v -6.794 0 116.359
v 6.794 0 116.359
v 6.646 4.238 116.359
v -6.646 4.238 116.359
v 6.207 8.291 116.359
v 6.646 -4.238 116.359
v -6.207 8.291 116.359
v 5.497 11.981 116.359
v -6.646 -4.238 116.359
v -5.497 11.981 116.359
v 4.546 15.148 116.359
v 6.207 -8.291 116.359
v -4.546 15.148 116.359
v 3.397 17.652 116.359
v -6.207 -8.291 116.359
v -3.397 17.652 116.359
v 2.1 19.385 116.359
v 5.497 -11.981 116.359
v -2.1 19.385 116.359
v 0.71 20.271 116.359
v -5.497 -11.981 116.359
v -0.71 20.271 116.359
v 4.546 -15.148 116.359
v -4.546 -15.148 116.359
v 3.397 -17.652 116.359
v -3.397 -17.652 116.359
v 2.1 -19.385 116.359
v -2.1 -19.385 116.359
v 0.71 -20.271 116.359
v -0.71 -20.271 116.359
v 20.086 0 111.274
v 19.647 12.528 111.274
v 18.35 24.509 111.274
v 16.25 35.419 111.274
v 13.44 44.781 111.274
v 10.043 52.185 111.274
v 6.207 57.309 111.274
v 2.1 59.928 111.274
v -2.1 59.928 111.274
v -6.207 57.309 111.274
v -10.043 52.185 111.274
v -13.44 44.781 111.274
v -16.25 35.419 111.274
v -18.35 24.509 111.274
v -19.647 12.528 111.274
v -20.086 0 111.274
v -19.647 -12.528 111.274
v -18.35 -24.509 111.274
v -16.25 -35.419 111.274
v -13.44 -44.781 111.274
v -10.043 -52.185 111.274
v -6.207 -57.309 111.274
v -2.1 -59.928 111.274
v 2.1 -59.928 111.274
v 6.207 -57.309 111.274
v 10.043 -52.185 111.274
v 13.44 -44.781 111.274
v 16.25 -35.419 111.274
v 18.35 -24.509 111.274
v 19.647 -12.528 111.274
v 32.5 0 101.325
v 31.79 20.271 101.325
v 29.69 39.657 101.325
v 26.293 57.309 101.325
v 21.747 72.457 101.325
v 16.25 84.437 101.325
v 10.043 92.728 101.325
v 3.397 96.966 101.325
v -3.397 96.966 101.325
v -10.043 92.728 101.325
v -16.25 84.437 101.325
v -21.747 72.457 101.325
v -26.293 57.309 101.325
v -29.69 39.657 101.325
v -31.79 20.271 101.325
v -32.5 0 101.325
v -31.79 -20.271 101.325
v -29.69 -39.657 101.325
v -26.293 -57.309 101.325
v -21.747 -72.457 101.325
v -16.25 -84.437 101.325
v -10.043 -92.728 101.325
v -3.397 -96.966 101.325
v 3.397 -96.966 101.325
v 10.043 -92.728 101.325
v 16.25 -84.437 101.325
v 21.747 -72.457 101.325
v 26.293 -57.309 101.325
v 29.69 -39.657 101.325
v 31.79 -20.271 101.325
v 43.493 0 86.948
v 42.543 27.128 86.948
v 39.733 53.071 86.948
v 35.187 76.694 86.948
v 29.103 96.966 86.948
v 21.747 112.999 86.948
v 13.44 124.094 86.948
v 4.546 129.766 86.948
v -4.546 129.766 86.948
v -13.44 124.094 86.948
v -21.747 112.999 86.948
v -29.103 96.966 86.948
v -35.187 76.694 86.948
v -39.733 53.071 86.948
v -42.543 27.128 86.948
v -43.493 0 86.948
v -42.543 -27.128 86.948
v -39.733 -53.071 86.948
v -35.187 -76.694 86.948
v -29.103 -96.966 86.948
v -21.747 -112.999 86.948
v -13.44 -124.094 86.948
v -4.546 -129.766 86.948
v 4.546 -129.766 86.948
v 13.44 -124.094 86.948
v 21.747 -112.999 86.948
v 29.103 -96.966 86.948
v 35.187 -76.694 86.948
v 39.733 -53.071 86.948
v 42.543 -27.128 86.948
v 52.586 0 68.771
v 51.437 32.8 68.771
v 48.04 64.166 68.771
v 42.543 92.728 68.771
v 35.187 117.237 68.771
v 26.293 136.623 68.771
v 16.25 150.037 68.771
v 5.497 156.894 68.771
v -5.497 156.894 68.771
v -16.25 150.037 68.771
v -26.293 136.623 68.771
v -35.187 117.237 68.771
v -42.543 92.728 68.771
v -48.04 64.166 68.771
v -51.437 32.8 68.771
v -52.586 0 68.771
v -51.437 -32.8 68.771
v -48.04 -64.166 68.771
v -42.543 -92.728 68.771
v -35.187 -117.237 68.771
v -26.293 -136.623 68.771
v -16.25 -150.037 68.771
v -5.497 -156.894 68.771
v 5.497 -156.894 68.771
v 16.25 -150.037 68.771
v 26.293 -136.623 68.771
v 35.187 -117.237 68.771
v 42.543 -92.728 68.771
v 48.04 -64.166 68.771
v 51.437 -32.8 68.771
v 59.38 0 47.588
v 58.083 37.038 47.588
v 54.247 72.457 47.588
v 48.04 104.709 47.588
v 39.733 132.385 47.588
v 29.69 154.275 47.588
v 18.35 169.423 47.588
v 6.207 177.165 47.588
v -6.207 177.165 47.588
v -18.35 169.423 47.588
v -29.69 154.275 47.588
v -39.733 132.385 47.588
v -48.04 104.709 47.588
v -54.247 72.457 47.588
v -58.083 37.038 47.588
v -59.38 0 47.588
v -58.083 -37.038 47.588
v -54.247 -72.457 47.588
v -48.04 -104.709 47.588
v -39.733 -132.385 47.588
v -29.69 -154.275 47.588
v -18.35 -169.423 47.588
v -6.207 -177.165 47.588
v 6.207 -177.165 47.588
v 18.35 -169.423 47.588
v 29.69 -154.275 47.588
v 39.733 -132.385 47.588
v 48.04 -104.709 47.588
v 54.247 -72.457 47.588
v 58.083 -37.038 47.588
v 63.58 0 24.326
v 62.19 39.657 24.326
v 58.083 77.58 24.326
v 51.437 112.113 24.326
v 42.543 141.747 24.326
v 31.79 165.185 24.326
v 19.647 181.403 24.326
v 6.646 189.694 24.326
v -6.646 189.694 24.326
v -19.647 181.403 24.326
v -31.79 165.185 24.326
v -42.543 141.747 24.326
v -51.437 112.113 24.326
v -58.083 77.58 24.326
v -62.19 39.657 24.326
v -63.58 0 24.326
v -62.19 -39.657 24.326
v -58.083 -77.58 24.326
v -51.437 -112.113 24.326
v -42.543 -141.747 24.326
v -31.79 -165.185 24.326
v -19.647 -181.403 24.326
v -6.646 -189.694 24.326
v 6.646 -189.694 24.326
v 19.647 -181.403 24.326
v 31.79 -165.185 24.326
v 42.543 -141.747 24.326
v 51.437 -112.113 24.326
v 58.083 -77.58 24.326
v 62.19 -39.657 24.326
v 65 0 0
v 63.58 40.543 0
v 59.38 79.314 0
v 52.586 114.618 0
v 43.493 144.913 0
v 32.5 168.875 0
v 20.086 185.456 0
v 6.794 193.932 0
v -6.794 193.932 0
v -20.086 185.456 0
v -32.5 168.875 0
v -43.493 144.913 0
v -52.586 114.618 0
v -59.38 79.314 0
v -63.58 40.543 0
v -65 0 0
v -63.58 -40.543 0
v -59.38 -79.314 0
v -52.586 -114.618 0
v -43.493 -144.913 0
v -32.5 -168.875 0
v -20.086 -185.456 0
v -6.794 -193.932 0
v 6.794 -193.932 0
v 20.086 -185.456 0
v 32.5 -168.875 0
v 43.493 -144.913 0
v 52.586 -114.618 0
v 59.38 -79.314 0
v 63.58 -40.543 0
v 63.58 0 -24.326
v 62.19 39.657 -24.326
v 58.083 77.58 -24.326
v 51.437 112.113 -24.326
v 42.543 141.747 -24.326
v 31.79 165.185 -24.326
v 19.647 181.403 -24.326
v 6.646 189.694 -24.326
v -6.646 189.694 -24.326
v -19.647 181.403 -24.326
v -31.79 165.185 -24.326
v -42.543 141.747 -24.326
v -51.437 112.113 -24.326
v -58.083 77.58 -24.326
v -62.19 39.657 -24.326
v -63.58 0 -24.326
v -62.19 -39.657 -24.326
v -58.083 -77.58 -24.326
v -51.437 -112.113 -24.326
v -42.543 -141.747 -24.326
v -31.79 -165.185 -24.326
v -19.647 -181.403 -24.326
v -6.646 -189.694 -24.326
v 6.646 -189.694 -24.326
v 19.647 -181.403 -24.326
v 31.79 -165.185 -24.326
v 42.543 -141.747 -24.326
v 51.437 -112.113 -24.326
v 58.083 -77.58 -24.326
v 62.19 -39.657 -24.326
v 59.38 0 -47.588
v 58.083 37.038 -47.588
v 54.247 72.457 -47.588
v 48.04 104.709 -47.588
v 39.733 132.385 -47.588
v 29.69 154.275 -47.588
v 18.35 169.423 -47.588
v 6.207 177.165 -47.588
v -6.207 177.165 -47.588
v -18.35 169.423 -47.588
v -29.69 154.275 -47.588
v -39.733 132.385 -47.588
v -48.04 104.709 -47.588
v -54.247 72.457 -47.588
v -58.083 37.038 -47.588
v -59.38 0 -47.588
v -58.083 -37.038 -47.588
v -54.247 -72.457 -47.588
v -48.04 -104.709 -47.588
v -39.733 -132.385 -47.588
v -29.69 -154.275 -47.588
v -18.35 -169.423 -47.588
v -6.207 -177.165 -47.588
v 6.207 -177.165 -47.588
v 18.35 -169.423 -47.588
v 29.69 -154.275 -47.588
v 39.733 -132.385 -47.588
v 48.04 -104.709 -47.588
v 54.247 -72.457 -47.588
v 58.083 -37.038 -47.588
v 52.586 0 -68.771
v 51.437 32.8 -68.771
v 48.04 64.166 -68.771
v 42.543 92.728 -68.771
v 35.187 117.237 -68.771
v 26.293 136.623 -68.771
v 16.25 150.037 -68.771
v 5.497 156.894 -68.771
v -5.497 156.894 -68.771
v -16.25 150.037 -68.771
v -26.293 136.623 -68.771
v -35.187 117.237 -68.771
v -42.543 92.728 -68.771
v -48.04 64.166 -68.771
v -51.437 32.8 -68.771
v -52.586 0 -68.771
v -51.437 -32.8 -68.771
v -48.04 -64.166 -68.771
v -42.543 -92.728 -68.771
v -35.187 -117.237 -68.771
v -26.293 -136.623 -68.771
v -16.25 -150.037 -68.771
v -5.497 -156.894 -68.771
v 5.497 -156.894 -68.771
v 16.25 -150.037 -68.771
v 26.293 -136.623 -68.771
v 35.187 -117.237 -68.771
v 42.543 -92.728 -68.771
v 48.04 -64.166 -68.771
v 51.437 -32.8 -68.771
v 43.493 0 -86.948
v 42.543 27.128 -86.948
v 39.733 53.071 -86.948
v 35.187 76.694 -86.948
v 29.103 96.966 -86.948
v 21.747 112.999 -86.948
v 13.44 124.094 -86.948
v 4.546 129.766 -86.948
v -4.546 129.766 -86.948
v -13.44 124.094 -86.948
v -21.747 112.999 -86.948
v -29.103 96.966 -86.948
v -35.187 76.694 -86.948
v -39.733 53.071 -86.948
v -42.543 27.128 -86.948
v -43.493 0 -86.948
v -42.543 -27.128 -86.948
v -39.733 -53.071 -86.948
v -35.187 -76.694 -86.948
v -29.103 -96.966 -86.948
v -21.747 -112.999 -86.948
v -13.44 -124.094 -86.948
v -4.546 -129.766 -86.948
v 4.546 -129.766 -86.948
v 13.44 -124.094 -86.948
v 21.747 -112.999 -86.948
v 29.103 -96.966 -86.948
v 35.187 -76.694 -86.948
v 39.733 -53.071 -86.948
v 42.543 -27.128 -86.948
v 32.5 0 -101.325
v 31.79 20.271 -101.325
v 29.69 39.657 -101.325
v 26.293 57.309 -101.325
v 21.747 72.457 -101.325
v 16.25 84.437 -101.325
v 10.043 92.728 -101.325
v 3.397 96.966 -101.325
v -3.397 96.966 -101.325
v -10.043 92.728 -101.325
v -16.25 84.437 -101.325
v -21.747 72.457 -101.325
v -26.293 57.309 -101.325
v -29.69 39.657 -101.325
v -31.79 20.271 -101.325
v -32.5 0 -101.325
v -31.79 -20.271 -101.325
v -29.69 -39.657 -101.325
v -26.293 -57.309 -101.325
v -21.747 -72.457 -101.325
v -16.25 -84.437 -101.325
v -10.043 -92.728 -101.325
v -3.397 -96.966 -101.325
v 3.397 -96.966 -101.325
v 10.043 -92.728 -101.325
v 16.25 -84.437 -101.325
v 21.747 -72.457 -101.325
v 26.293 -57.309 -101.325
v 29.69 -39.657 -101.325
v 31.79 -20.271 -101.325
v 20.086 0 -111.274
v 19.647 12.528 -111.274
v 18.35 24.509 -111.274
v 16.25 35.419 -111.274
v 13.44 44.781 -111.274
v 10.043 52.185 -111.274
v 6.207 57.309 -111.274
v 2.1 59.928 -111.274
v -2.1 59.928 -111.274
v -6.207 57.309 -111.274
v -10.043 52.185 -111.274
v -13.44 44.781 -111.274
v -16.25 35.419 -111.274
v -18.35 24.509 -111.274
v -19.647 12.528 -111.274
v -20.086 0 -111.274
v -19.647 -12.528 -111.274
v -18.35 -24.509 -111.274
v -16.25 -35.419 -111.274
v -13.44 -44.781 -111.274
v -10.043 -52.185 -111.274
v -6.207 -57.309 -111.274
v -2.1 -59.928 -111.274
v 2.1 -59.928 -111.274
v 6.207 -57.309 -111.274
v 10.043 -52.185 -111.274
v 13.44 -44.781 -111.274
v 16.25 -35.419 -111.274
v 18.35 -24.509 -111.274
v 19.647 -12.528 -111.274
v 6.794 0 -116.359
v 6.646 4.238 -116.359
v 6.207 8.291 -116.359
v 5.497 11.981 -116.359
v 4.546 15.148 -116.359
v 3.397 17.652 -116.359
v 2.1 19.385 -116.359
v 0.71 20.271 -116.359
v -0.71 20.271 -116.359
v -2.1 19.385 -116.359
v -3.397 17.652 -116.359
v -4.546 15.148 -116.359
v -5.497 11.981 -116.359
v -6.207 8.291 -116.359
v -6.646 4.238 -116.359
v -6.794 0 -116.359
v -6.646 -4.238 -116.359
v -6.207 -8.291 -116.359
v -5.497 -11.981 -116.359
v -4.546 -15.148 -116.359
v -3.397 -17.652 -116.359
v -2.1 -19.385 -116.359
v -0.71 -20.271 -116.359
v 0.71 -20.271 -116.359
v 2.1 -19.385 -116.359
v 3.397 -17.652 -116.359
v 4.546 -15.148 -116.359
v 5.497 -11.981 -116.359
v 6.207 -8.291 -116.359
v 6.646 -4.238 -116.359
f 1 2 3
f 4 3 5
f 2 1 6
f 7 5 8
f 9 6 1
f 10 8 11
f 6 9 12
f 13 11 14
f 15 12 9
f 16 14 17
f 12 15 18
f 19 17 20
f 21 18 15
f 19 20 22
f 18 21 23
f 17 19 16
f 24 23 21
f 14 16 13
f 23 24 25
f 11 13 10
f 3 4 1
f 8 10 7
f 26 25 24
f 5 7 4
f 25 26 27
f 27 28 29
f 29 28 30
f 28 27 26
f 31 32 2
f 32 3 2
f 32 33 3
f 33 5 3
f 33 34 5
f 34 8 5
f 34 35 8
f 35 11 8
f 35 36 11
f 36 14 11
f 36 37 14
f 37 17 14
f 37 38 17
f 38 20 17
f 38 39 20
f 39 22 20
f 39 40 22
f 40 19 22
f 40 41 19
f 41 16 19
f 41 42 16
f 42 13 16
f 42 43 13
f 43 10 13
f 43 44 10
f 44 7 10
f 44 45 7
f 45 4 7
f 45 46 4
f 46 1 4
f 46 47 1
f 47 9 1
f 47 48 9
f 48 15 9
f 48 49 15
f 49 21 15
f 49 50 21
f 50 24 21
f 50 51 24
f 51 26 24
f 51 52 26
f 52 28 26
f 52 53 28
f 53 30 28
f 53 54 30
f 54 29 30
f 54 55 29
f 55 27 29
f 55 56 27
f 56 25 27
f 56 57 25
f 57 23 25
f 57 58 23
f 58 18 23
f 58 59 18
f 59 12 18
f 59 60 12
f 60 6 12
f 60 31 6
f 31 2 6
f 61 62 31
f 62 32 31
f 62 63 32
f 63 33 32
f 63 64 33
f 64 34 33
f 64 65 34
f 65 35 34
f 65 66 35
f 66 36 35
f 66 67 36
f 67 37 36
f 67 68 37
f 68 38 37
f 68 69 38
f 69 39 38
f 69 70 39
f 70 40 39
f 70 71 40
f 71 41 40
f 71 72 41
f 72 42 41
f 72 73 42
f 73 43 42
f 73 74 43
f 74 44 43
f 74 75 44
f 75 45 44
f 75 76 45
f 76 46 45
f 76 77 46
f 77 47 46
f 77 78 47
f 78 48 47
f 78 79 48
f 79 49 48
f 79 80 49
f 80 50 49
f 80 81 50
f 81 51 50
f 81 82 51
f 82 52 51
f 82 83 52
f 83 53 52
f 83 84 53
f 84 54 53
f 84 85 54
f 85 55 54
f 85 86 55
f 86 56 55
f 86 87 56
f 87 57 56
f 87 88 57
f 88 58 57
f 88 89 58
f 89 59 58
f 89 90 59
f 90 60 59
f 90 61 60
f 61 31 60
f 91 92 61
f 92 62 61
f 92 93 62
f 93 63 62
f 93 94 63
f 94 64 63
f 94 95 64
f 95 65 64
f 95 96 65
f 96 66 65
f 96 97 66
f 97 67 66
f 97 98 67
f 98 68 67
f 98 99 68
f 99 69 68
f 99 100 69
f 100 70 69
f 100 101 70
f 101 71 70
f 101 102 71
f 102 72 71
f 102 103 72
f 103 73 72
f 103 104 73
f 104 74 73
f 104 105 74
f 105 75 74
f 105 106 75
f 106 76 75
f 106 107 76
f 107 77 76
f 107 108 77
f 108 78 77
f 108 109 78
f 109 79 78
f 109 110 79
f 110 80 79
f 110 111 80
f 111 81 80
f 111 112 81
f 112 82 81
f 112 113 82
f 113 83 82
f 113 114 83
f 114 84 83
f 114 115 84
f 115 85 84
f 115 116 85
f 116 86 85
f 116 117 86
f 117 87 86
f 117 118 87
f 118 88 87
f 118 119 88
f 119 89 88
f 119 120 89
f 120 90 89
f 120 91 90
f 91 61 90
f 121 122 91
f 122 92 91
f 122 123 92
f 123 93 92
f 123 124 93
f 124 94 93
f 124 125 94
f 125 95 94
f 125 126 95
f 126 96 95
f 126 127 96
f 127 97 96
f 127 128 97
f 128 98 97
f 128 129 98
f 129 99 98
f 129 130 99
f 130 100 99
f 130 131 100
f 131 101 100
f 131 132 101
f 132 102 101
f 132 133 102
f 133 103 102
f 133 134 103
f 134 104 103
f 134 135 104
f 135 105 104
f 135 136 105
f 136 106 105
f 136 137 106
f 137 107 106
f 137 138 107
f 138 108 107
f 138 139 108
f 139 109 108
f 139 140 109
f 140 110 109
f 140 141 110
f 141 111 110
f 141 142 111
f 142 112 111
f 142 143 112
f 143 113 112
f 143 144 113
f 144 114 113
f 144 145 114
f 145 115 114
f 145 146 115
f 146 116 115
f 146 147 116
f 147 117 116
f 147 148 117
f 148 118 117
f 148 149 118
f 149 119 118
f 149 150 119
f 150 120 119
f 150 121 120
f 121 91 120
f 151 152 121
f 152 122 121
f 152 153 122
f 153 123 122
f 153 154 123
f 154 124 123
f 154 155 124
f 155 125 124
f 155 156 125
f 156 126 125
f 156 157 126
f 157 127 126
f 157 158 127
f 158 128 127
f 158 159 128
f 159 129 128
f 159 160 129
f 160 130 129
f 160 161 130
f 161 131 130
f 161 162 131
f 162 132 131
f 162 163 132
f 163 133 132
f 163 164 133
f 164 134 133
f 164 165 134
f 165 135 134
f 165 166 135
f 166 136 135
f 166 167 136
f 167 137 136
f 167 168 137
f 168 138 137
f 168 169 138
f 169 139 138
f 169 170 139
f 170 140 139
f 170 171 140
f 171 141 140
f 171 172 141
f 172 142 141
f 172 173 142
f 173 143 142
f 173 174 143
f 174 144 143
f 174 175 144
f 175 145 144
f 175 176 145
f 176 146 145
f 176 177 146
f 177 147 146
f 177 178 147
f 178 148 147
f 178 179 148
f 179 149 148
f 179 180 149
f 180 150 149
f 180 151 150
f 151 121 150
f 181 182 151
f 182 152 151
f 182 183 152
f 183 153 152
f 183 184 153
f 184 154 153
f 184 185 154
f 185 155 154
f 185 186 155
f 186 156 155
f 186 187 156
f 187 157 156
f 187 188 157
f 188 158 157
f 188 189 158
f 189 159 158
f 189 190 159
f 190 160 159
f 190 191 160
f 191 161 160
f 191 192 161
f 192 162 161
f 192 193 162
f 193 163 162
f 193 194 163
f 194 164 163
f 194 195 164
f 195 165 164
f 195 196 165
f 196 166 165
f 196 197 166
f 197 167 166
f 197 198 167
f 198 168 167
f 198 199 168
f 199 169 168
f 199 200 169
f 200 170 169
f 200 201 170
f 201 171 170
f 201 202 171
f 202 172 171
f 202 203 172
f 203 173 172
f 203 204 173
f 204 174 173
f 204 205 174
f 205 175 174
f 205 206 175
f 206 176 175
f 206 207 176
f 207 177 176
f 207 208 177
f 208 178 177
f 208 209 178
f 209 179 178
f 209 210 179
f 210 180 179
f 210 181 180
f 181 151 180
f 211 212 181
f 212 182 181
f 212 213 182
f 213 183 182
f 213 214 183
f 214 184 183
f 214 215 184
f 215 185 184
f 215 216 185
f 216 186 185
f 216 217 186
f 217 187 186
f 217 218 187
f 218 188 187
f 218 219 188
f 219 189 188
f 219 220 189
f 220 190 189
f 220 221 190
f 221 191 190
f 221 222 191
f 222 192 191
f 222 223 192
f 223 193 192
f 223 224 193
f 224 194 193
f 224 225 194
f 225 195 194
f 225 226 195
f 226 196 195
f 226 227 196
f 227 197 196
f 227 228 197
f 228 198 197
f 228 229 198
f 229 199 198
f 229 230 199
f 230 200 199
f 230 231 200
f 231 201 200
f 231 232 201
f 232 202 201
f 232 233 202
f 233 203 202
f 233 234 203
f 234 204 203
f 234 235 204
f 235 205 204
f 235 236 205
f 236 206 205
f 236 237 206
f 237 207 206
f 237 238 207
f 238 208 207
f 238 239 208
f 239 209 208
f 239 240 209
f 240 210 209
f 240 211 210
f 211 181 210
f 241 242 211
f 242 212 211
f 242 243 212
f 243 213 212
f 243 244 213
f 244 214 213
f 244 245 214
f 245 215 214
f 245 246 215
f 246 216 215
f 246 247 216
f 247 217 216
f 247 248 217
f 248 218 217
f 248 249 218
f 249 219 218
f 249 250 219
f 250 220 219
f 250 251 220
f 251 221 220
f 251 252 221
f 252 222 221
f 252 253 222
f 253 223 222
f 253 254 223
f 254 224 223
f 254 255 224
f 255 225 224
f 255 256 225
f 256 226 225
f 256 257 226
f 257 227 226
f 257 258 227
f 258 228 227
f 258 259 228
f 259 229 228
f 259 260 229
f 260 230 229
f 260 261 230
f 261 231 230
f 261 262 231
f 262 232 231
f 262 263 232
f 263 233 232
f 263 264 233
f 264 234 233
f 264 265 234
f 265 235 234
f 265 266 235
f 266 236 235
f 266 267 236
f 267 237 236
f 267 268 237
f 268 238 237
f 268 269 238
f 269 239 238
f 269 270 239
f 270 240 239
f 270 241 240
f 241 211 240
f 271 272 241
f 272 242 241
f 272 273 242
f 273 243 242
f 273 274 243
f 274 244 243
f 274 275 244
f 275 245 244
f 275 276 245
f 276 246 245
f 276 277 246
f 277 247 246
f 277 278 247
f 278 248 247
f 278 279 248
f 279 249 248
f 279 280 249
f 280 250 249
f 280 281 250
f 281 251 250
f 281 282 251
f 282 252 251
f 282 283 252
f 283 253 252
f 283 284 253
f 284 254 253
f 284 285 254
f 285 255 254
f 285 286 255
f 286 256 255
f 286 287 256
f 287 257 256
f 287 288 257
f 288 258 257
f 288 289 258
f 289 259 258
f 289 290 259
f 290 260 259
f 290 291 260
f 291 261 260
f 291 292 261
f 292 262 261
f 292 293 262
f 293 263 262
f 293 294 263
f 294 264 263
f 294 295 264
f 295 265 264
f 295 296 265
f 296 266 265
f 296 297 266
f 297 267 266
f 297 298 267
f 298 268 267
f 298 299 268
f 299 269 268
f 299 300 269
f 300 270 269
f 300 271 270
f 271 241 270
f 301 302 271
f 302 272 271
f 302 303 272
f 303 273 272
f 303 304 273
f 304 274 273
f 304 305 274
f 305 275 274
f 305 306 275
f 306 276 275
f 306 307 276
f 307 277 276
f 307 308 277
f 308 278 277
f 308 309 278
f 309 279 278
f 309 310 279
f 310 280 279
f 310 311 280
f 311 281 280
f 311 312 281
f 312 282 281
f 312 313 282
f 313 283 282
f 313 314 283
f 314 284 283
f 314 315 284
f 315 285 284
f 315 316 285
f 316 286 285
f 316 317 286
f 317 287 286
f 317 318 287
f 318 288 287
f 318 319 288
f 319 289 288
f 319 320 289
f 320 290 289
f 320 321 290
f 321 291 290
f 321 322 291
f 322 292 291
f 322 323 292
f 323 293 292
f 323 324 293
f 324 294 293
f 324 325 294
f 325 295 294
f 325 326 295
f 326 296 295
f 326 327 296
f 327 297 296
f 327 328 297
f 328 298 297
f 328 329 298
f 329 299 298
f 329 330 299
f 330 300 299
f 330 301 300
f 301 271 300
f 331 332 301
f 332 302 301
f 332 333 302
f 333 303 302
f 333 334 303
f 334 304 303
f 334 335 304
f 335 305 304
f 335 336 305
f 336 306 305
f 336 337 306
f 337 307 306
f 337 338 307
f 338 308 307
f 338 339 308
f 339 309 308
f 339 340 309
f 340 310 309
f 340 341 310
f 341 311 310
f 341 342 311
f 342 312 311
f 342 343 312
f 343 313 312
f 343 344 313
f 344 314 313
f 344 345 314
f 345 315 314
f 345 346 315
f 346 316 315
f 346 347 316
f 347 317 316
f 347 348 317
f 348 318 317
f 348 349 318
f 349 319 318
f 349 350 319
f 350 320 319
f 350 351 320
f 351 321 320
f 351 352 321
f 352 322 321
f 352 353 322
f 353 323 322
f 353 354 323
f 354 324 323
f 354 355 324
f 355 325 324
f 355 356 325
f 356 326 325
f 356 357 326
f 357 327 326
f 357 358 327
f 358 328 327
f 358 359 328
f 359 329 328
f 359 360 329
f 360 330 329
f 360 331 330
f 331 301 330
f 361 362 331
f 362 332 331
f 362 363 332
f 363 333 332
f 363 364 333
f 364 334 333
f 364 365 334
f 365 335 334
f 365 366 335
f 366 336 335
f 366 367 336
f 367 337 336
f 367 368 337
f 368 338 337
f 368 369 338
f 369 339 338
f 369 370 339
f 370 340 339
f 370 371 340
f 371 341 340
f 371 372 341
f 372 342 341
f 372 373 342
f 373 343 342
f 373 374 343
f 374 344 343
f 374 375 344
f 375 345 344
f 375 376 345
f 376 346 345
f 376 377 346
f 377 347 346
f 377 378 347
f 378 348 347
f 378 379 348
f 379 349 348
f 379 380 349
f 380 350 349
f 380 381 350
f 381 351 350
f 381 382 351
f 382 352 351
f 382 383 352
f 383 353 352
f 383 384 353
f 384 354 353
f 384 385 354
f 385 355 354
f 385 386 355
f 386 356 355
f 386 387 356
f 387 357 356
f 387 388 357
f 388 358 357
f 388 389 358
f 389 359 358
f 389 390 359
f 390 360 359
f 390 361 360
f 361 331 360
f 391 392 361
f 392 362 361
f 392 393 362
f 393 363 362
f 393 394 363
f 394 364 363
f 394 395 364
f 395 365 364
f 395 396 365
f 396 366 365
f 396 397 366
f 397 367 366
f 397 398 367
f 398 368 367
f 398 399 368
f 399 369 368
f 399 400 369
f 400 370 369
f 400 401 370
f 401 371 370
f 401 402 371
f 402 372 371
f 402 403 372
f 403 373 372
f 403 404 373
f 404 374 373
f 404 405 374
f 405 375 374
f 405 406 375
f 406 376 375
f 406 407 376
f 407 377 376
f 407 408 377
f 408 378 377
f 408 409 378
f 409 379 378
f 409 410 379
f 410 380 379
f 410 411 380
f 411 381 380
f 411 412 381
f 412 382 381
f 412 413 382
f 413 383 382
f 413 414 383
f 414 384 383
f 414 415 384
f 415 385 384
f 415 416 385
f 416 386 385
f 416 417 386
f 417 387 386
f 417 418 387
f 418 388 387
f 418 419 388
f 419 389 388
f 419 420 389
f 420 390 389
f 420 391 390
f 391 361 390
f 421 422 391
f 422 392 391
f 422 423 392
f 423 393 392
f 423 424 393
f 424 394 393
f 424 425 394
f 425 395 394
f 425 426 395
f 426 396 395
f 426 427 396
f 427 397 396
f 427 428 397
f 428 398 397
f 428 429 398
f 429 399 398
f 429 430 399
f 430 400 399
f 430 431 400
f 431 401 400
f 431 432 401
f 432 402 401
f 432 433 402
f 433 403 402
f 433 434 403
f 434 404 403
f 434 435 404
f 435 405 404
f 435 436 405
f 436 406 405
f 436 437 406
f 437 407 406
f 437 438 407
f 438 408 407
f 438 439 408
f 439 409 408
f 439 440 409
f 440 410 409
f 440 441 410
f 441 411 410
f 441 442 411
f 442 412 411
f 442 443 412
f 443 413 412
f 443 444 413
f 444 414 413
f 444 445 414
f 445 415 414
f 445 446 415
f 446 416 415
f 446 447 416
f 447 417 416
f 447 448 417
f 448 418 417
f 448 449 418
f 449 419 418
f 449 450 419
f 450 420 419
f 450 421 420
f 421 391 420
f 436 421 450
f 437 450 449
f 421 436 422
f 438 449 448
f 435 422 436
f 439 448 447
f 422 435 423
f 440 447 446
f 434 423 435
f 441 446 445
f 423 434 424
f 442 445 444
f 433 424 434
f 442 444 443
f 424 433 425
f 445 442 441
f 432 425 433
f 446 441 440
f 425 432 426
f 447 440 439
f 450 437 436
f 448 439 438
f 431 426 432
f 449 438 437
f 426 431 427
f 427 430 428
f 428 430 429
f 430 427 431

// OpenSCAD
// Generated by SolidPython 1.0.1 on 2020-07-29 00:46:46


scale(v = [5, 15, 9]) {
	sphere(r = 13);
}
/***********************************************
*********      SolidPython code:      **********
************************************************
 
# import packages: SolidPython
from solid import *
from solid.utils import *
from itertools import chain, combinations, permutations


class Resize:

    def __init__(self, scad_file):
        self.scad_file = scad_file
        #self.scad_file = import_scad(scad_file)
        # cone/cylinder param:
        self.r1 = 0
        self.r2 = 0
        self.h = 0
        # rectangular prism param:
        self.w = 0
        self.l = 0
        # ellipse param:
        self.r = 0

    # import OpenScad code (file name corresponds to shape)


    # classify shape + parameters
    def assign(self, param1, param2, param3):
        if self.scad_file == 'cone.scad':
            self.r1 = param1
            self.r2 = param2
            self.h = param3
        elif self.scad_file == 'cylinder.scad':
            self.r1 = param1
            self.r2 = param2
            self.h = param3
        elif self.scad_file == 'rectangularPrism.scad':
            self.h = param1
            self.l = param2
            self.w = param3
        else:
            self.r = param1
            self.h = param2

    # resize parameters
    def iterate(self):
        x = range(3, 20, 2)
        i = 1
        if self.scad_file == 'cone.scad':
            tempList = list(permutations(x, 2))
            for temp in tempList:
                param1 = temp[0]
                param2 = temp[1]
                filepath = 'produced_scad_files/' + 'cone' + str(param1) + '_' + str(param2) + '_' + '.scad'
                scad_render_to_file(cylinder(h=param1, r1=param2, r2=0), filepath)

        elif self.scad_file == 'cylinder.scad':
            tempList = list(permutations(x, 3))
            for temp in tempList:
                param1 = temp[0]
                param2 = temp[1]
                filepath = 'produced_scad_files/' + 'cylinder' + str(param1) + '_' + str(param2) + '_' + '.scad'
                scad_render_to_file(cylinder(h=param1, r1=param2, r2=param2), filepath)

        elif self.scad_file == 'rectangularPrism.scad':
            tempList = list(permutations(x, 3))
            for temp in tempList:
                param1 = temp[0]
                param2 = temp[1]
                param3 = temp[2]
                filepath = 'produced_scad_files/' + 'rectangularPrism' + str(param1) + '_' + str(param2) + '_' + str(
                    param3) + '.scad'
                scad_render_to_file(cube(size=(param1, param2, param3)), filepath)

        elif self.scad_file == 'ellipse.scad':
            tempList = list(permutations(x, 4))
            for temp in tempList:
                param1 = temp[0]
                param2 = temp[1]
                param3 = temp[2]
                param4 = temp[3]
                filepath = 'produced_scad_files/' + 'ellipse' + str(param1) + '_' + str(param2) + '_' + str(param3) + '_' + str(param4) + '.scad'
                scad_render_to_file(scale([param1, param2, param3])(sphere(r=param4)), filepath)

    def render_to_scadfile(self):
        scad_render_to_file(scad, 'example.scad') 
 
************************************************/
